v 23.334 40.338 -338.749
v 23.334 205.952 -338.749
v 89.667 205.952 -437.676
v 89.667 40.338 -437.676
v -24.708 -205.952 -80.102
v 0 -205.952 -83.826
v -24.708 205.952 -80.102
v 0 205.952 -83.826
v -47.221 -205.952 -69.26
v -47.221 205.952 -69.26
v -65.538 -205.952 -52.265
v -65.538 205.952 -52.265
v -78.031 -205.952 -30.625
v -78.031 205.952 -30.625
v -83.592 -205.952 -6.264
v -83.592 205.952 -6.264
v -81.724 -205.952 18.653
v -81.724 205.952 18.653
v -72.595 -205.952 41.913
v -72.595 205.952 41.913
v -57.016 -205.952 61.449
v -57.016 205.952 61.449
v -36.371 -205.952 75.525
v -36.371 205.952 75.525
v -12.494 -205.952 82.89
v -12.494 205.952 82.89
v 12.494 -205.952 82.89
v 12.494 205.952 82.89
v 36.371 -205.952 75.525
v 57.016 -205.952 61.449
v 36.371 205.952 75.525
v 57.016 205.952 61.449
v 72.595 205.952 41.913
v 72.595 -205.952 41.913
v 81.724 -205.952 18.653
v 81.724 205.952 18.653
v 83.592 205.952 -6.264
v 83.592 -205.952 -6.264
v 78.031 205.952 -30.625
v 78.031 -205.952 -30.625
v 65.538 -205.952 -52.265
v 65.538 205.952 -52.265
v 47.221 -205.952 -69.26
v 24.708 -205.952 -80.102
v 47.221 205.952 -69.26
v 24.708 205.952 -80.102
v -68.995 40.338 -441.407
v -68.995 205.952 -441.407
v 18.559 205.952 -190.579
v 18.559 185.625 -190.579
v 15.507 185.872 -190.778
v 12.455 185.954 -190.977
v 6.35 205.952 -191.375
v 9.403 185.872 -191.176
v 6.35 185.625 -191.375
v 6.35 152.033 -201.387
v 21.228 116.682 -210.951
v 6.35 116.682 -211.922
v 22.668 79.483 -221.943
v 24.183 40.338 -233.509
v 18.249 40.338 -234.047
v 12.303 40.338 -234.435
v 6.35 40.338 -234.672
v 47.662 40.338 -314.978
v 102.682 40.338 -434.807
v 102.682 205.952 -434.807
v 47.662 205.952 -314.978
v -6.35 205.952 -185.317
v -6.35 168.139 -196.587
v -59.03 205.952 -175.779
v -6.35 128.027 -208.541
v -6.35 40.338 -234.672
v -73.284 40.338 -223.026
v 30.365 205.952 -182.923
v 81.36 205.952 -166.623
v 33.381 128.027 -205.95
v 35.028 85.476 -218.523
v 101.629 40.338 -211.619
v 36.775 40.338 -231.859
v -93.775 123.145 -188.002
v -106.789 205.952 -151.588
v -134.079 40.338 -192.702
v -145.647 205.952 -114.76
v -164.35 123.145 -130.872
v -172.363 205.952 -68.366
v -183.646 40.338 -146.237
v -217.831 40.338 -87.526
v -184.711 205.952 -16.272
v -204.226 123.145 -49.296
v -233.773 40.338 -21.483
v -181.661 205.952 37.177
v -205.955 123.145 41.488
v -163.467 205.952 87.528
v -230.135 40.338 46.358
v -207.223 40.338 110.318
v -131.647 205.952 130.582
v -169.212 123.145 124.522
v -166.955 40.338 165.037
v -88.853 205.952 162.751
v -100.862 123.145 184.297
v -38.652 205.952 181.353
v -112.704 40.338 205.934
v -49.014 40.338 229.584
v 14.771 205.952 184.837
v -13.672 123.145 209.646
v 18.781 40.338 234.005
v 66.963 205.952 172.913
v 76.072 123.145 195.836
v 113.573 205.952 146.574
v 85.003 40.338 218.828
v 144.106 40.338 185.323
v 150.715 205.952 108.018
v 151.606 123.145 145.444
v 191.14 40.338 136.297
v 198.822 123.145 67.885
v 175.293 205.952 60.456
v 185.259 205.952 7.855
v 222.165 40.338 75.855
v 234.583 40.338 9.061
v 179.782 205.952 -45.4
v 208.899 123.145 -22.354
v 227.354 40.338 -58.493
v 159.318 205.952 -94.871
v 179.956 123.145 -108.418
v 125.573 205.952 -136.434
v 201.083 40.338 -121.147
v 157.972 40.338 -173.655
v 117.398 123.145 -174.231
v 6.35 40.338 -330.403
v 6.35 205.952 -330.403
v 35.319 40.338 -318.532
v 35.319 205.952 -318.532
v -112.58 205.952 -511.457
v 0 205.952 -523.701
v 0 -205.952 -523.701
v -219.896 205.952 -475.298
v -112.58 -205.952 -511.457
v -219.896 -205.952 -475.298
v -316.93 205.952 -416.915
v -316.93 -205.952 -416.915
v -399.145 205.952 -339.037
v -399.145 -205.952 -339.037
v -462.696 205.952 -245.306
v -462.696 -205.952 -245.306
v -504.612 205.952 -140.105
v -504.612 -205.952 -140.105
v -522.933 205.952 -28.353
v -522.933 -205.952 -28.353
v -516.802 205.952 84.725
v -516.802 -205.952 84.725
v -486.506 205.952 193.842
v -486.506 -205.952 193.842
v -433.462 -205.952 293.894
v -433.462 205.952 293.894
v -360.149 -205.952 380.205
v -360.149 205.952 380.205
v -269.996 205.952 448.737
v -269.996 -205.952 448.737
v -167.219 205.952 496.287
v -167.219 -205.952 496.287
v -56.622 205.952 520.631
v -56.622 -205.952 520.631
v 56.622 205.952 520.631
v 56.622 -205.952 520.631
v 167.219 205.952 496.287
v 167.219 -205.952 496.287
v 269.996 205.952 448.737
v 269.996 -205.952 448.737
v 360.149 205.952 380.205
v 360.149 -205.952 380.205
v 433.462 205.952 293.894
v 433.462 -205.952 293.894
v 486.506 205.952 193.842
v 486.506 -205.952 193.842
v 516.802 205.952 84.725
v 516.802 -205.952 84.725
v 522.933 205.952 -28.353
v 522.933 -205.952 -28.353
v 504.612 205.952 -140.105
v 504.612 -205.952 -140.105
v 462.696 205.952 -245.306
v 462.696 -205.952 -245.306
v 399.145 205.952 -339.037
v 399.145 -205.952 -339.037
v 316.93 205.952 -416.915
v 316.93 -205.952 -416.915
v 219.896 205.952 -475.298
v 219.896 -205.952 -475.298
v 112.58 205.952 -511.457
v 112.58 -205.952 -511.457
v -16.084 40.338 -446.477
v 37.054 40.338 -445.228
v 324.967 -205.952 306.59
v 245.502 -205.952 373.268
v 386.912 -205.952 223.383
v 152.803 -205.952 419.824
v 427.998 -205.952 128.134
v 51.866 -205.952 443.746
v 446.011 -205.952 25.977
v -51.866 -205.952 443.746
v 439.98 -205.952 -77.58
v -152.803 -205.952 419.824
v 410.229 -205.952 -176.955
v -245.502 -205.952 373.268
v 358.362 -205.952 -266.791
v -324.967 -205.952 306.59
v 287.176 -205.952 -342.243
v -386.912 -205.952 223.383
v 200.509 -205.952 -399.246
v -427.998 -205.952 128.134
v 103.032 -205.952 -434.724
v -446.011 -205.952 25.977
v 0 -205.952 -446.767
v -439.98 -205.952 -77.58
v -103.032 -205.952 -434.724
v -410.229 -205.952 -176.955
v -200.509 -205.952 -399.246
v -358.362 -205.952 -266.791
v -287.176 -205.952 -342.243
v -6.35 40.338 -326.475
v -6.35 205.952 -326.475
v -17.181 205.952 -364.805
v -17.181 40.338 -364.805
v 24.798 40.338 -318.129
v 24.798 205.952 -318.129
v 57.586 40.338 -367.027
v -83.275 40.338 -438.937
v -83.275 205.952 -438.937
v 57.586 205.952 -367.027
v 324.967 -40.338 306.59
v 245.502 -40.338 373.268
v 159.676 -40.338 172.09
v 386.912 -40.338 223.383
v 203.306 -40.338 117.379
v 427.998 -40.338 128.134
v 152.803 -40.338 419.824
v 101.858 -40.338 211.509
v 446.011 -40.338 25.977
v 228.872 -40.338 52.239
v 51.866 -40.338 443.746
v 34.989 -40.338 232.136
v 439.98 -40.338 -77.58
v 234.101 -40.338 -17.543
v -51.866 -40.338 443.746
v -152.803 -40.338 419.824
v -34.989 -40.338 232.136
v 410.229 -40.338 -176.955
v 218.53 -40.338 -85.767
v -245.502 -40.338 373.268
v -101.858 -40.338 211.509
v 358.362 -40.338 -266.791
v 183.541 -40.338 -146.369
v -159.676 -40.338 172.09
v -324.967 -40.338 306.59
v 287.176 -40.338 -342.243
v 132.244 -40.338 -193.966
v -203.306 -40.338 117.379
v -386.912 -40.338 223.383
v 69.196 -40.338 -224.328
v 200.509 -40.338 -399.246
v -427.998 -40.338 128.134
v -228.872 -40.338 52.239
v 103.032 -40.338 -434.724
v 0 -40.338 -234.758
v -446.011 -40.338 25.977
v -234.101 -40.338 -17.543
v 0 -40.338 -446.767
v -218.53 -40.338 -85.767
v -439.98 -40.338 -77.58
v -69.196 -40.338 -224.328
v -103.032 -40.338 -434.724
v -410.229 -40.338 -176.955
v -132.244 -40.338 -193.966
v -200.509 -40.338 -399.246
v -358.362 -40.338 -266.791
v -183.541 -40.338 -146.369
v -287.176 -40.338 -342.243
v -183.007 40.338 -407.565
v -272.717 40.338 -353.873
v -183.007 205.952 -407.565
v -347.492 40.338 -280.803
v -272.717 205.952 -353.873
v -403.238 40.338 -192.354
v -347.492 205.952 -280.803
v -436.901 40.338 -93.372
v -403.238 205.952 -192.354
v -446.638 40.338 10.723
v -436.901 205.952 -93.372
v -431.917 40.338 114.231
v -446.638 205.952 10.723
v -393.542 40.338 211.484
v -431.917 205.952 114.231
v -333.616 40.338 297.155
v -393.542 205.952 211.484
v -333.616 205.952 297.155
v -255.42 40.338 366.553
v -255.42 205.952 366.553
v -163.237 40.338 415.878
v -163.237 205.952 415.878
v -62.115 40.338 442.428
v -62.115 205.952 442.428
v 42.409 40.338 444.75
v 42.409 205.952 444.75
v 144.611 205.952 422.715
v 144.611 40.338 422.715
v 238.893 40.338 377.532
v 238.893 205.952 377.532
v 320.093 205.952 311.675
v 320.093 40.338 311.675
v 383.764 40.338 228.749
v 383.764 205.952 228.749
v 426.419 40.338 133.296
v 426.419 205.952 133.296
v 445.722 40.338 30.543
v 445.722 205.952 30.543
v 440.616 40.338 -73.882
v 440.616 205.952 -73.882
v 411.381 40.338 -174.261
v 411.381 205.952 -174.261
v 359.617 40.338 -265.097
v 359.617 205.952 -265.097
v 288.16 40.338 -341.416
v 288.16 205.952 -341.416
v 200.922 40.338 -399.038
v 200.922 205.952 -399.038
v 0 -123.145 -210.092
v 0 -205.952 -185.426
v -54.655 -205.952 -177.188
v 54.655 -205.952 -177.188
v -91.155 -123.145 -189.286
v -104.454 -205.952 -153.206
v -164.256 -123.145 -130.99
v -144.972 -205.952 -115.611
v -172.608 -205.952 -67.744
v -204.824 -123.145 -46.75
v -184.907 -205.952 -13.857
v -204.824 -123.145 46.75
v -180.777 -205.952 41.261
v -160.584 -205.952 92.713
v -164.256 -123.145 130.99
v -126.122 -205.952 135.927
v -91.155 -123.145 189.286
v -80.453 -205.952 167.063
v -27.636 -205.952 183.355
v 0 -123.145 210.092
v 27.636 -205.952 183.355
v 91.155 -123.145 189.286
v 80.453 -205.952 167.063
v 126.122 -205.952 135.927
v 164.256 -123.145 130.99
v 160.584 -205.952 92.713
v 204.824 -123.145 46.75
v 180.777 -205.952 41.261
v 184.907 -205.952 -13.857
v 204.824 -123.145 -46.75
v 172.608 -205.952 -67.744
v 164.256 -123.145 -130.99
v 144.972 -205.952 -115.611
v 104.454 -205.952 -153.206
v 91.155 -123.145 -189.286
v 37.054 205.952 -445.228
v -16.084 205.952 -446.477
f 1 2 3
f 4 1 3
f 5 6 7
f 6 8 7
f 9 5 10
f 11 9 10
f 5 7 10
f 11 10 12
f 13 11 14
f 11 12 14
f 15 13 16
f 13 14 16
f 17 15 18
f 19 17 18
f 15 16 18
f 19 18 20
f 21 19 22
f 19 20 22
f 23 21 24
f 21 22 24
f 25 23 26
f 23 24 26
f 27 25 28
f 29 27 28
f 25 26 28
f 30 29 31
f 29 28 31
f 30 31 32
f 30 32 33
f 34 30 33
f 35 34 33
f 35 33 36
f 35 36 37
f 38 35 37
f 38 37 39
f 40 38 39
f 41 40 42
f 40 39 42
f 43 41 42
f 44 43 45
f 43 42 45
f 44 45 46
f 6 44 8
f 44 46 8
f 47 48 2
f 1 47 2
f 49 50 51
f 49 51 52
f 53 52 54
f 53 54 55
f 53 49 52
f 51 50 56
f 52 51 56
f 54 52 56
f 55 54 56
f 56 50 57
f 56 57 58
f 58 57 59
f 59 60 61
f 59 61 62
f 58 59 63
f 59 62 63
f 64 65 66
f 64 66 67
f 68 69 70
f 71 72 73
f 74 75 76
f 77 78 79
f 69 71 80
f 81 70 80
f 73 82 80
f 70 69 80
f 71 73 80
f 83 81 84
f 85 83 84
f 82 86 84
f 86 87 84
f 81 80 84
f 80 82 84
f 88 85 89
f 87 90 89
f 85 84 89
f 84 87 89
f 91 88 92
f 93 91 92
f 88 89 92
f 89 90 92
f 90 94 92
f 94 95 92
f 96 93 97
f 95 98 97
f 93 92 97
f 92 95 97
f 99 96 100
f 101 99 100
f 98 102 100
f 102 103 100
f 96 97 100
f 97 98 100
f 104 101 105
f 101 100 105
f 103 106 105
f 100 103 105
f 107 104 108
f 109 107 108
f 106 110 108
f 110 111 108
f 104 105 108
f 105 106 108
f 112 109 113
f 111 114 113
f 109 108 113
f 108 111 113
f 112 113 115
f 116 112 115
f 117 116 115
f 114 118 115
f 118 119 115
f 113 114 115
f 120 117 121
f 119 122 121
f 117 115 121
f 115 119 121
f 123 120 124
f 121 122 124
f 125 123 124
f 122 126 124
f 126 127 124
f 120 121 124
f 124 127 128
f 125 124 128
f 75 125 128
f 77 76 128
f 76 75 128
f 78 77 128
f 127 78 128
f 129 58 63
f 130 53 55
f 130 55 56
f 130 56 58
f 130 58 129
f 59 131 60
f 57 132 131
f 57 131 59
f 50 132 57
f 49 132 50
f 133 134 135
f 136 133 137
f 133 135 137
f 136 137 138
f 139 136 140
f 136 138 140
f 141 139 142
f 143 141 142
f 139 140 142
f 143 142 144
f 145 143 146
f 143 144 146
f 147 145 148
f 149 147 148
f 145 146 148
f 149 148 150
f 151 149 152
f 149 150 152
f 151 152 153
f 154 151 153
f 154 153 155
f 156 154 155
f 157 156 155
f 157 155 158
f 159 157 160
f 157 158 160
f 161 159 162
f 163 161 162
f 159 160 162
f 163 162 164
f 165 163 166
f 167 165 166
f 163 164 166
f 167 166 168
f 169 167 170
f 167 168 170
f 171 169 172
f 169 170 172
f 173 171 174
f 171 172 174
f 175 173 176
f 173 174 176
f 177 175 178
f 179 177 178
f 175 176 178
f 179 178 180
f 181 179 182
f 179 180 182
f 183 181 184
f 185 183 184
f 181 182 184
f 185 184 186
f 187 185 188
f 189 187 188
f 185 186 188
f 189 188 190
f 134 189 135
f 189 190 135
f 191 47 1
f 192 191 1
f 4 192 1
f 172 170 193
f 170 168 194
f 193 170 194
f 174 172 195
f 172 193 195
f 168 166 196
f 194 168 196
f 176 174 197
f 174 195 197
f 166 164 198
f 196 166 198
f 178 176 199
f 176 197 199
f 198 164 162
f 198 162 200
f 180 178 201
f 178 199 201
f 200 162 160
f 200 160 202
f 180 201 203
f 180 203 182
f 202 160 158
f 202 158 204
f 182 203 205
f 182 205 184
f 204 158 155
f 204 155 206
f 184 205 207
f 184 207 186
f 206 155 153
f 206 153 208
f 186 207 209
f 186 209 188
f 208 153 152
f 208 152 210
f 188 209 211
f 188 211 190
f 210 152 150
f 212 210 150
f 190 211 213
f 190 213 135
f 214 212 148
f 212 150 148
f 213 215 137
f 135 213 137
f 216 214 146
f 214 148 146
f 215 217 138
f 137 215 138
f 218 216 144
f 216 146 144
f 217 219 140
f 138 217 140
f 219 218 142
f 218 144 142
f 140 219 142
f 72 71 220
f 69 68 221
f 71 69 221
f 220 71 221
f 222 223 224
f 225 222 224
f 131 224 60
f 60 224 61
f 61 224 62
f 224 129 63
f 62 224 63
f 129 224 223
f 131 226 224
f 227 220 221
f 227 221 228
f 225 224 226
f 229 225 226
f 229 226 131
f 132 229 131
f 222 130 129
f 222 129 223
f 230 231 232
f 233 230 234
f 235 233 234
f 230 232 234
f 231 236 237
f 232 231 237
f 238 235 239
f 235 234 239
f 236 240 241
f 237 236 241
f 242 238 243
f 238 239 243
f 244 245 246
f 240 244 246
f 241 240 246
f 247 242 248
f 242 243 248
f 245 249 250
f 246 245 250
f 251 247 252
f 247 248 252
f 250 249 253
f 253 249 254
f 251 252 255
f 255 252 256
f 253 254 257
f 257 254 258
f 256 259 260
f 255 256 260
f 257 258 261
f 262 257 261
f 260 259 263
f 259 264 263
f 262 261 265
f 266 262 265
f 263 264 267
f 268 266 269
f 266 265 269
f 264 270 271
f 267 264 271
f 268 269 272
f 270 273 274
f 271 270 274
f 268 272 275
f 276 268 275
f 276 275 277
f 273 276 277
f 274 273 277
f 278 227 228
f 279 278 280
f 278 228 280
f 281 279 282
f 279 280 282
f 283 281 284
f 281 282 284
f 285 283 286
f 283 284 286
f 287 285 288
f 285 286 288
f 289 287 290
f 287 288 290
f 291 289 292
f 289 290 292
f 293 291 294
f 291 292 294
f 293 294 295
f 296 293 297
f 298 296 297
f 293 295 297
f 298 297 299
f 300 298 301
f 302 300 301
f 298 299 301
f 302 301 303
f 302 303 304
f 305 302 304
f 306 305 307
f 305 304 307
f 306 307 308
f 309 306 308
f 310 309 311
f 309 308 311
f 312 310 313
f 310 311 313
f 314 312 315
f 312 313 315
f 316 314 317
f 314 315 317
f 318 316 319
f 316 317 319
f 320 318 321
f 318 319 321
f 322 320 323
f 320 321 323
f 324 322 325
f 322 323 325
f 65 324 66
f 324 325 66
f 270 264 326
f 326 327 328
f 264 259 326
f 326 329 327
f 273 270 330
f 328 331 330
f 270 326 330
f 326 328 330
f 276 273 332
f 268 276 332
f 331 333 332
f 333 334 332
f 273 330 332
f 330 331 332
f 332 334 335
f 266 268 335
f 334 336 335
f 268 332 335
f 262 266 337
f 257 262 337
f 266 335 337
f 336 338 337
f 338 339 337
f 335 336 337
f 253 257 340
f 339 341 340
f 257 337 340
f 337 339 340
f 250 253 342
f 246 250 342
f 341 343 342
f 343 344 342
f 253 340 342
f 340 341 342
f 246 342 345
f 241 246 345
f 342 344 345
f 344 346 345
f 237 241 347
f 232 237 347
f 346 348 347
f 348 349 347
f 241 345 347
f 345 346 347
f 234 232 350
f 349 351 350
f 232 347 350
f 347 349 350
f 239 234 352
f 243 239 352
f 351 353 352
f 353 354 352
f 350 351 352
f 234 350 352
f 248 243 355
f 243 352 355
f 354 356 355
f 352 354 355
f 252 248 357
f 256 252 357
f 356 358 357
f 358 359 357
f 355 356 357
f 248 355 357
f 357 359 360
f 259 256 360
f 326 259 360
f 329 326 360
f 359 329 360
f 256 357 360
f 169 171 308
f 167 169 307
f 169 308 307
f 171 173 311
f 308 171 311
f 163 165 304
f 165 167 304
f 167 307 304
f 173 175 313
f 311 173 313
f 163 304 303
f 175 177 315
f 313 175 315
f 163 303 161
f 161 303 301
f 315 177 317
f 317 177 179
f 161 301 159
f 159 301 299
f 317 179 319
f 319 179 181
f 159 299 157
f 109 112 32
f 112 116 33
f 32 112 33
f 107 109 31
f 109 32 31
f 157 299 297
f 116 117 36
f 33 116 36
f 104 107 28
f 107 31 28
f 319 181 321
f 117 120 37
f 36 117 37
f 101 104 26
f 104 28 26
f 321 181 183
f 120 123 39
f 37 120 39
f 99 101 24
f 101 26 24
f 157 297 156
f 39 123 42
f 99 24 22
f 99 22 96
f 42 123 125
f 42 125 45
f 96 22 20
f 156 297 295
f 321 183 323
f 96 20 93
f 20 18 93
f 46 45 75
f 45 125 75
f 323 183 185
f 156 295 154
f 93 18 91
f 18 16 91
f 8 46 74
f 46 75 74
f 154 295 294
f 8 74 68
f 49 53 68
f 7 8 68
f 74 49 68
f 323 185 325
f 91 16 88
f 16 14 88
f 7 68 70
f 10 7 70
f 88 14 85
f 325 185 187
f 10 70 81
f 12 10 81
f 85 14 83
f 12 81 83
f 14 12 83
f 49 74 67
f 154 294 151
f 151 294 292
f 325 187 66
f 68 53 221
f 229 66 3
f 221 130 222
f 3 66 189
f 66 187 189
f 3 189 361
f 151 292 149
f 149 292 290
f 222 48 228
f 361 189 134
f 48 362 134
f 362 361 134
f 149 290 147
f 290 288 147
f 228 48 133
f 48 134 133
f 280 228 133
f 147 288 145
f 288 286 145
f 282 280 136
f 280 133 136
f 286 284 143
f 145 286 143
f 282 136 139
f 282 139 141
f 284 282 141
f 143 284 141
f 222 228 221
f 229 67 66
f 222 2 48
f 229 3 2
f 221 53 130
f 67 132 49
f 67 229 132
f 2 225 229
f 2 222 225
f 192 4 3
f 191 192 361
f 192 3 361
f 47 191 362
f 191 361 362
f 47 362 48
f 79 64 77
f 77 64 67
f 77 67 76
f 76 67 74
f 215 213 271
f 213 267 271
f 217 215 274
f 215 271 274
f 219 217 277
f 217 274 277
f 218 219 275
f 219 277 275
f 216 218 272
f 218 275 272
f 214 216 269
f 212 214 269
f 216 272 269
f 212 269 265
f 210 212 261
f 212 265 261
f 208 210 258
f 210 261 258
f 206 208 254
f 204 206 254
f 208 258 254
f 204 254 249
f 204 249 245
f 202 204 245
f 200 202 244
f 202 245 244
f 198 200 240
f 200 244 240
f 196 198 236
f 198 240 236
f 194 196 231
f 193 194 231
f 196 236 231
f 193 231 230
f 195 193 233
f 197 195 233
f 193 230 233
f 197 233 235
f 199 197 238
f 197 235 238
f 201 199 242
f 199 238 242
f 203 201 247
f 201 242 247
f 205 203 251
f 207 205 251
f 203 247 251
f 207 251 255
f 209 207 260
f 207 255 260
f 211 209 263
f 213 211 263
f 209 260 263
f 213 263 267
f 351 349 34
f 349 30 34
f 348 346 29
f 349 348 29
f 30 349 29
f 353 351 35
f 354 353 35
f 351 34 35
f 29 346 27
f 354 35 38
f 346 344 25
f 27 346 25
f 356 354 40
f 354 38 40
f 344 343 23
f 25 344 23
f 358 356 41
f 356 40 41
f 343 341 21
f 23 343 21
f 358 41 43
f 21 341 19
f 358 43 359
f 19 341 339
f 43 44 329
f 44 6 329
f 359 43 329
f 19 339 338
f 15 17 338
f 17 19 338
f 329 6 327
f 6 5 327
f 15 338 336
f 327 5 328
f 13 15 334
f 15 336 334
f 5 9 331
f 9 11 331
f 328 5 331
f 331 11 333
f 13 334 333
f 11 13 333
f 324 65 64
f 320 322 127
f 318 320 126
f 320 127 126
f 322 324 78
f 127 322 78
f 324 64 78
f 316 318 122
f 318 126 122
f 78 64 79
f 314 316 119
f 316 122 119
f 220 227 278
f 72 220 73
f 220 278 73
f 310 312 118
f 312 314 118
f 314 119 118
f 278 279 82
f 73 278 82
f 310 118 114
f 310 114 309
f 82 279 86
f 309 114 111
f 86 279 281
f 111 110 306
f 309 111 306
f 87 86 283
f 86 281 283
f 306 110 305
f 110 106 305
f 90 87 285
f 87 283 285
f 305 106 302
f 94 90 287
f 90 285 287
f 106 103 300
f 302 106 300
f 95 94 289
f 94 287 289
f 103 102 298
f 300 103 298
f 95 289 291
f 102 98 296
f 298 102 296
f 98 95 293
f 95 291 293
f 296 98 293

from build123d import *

# Parameters (mm, degrees)
RIB3_REACH = 849.461


with BuildPart() as part:
    # Sketch2 → Revolve2 (revolve)
    with BuildSketch(Plane.XY, mode=Mode.PRIVATE) as revolve2_sk:
        Polygon((-83.825932003, -205.951906896), (-83.825932003, 205.951906896), (-185.425932003, 205.951906896), (-234.75772391, 40.338034064), (-446.766972465, 40.338034064), (-446.766972465, 205.951906896), (-523.701076512, 205.951906896), (-523.701076512, -205.951906896), (-446.766972465, -205.951906896), (-446.766972465, -40.338034064), (-234.75772391, -40.338034064), (-185.425932003, -205.951906896), align=None)
    revolve(revolve2_sk.sketch.rotate(Axis((0, 0, 0), (0, 1, 0)), 270), axis=Axis((0, 0, 0), (0, 1, 0)))

    # Sketch15 walls → Rib3 (add, up to next)
    with BuildSketch(Plane(origin=(0, 205.951906896, 0), x_dir=(1, 0, 0), z_dir=(0, 1, 0)), mode=Mode.PRIVATE) as rib3_sk1:
        Polygon((-6.35, 179.47656005), (-6.35, 326.47470397), (-135.682333379, 515.555894782), (23.333889095, 338.748721611), (135.129805155, 505.477172887), (47.662469422, 314.977908793), (29.606309095, 177.131658856), align=None)
        Polygon((6.35, 191.375303956), (6.35, 330.402645947), (-17.181459102, 364.805151432), (24.798310455, 318.128628306), (57.585986403, 367.02700156), (35.319488971, 318.531739424), (18.559266197, 190.579073097), align=None, mode=Mode.SUBTRACT)
    rib3_tool1 = extrude(rib3_sk1.sketch, amount=-RIB3_REACH, mode=Mode.PRIVATE) - part.part
    add(rib3_tool1.solids().sort_by_distance((60.211997777, 205.951906896, -382.345381091))[0])


solid = part.part
